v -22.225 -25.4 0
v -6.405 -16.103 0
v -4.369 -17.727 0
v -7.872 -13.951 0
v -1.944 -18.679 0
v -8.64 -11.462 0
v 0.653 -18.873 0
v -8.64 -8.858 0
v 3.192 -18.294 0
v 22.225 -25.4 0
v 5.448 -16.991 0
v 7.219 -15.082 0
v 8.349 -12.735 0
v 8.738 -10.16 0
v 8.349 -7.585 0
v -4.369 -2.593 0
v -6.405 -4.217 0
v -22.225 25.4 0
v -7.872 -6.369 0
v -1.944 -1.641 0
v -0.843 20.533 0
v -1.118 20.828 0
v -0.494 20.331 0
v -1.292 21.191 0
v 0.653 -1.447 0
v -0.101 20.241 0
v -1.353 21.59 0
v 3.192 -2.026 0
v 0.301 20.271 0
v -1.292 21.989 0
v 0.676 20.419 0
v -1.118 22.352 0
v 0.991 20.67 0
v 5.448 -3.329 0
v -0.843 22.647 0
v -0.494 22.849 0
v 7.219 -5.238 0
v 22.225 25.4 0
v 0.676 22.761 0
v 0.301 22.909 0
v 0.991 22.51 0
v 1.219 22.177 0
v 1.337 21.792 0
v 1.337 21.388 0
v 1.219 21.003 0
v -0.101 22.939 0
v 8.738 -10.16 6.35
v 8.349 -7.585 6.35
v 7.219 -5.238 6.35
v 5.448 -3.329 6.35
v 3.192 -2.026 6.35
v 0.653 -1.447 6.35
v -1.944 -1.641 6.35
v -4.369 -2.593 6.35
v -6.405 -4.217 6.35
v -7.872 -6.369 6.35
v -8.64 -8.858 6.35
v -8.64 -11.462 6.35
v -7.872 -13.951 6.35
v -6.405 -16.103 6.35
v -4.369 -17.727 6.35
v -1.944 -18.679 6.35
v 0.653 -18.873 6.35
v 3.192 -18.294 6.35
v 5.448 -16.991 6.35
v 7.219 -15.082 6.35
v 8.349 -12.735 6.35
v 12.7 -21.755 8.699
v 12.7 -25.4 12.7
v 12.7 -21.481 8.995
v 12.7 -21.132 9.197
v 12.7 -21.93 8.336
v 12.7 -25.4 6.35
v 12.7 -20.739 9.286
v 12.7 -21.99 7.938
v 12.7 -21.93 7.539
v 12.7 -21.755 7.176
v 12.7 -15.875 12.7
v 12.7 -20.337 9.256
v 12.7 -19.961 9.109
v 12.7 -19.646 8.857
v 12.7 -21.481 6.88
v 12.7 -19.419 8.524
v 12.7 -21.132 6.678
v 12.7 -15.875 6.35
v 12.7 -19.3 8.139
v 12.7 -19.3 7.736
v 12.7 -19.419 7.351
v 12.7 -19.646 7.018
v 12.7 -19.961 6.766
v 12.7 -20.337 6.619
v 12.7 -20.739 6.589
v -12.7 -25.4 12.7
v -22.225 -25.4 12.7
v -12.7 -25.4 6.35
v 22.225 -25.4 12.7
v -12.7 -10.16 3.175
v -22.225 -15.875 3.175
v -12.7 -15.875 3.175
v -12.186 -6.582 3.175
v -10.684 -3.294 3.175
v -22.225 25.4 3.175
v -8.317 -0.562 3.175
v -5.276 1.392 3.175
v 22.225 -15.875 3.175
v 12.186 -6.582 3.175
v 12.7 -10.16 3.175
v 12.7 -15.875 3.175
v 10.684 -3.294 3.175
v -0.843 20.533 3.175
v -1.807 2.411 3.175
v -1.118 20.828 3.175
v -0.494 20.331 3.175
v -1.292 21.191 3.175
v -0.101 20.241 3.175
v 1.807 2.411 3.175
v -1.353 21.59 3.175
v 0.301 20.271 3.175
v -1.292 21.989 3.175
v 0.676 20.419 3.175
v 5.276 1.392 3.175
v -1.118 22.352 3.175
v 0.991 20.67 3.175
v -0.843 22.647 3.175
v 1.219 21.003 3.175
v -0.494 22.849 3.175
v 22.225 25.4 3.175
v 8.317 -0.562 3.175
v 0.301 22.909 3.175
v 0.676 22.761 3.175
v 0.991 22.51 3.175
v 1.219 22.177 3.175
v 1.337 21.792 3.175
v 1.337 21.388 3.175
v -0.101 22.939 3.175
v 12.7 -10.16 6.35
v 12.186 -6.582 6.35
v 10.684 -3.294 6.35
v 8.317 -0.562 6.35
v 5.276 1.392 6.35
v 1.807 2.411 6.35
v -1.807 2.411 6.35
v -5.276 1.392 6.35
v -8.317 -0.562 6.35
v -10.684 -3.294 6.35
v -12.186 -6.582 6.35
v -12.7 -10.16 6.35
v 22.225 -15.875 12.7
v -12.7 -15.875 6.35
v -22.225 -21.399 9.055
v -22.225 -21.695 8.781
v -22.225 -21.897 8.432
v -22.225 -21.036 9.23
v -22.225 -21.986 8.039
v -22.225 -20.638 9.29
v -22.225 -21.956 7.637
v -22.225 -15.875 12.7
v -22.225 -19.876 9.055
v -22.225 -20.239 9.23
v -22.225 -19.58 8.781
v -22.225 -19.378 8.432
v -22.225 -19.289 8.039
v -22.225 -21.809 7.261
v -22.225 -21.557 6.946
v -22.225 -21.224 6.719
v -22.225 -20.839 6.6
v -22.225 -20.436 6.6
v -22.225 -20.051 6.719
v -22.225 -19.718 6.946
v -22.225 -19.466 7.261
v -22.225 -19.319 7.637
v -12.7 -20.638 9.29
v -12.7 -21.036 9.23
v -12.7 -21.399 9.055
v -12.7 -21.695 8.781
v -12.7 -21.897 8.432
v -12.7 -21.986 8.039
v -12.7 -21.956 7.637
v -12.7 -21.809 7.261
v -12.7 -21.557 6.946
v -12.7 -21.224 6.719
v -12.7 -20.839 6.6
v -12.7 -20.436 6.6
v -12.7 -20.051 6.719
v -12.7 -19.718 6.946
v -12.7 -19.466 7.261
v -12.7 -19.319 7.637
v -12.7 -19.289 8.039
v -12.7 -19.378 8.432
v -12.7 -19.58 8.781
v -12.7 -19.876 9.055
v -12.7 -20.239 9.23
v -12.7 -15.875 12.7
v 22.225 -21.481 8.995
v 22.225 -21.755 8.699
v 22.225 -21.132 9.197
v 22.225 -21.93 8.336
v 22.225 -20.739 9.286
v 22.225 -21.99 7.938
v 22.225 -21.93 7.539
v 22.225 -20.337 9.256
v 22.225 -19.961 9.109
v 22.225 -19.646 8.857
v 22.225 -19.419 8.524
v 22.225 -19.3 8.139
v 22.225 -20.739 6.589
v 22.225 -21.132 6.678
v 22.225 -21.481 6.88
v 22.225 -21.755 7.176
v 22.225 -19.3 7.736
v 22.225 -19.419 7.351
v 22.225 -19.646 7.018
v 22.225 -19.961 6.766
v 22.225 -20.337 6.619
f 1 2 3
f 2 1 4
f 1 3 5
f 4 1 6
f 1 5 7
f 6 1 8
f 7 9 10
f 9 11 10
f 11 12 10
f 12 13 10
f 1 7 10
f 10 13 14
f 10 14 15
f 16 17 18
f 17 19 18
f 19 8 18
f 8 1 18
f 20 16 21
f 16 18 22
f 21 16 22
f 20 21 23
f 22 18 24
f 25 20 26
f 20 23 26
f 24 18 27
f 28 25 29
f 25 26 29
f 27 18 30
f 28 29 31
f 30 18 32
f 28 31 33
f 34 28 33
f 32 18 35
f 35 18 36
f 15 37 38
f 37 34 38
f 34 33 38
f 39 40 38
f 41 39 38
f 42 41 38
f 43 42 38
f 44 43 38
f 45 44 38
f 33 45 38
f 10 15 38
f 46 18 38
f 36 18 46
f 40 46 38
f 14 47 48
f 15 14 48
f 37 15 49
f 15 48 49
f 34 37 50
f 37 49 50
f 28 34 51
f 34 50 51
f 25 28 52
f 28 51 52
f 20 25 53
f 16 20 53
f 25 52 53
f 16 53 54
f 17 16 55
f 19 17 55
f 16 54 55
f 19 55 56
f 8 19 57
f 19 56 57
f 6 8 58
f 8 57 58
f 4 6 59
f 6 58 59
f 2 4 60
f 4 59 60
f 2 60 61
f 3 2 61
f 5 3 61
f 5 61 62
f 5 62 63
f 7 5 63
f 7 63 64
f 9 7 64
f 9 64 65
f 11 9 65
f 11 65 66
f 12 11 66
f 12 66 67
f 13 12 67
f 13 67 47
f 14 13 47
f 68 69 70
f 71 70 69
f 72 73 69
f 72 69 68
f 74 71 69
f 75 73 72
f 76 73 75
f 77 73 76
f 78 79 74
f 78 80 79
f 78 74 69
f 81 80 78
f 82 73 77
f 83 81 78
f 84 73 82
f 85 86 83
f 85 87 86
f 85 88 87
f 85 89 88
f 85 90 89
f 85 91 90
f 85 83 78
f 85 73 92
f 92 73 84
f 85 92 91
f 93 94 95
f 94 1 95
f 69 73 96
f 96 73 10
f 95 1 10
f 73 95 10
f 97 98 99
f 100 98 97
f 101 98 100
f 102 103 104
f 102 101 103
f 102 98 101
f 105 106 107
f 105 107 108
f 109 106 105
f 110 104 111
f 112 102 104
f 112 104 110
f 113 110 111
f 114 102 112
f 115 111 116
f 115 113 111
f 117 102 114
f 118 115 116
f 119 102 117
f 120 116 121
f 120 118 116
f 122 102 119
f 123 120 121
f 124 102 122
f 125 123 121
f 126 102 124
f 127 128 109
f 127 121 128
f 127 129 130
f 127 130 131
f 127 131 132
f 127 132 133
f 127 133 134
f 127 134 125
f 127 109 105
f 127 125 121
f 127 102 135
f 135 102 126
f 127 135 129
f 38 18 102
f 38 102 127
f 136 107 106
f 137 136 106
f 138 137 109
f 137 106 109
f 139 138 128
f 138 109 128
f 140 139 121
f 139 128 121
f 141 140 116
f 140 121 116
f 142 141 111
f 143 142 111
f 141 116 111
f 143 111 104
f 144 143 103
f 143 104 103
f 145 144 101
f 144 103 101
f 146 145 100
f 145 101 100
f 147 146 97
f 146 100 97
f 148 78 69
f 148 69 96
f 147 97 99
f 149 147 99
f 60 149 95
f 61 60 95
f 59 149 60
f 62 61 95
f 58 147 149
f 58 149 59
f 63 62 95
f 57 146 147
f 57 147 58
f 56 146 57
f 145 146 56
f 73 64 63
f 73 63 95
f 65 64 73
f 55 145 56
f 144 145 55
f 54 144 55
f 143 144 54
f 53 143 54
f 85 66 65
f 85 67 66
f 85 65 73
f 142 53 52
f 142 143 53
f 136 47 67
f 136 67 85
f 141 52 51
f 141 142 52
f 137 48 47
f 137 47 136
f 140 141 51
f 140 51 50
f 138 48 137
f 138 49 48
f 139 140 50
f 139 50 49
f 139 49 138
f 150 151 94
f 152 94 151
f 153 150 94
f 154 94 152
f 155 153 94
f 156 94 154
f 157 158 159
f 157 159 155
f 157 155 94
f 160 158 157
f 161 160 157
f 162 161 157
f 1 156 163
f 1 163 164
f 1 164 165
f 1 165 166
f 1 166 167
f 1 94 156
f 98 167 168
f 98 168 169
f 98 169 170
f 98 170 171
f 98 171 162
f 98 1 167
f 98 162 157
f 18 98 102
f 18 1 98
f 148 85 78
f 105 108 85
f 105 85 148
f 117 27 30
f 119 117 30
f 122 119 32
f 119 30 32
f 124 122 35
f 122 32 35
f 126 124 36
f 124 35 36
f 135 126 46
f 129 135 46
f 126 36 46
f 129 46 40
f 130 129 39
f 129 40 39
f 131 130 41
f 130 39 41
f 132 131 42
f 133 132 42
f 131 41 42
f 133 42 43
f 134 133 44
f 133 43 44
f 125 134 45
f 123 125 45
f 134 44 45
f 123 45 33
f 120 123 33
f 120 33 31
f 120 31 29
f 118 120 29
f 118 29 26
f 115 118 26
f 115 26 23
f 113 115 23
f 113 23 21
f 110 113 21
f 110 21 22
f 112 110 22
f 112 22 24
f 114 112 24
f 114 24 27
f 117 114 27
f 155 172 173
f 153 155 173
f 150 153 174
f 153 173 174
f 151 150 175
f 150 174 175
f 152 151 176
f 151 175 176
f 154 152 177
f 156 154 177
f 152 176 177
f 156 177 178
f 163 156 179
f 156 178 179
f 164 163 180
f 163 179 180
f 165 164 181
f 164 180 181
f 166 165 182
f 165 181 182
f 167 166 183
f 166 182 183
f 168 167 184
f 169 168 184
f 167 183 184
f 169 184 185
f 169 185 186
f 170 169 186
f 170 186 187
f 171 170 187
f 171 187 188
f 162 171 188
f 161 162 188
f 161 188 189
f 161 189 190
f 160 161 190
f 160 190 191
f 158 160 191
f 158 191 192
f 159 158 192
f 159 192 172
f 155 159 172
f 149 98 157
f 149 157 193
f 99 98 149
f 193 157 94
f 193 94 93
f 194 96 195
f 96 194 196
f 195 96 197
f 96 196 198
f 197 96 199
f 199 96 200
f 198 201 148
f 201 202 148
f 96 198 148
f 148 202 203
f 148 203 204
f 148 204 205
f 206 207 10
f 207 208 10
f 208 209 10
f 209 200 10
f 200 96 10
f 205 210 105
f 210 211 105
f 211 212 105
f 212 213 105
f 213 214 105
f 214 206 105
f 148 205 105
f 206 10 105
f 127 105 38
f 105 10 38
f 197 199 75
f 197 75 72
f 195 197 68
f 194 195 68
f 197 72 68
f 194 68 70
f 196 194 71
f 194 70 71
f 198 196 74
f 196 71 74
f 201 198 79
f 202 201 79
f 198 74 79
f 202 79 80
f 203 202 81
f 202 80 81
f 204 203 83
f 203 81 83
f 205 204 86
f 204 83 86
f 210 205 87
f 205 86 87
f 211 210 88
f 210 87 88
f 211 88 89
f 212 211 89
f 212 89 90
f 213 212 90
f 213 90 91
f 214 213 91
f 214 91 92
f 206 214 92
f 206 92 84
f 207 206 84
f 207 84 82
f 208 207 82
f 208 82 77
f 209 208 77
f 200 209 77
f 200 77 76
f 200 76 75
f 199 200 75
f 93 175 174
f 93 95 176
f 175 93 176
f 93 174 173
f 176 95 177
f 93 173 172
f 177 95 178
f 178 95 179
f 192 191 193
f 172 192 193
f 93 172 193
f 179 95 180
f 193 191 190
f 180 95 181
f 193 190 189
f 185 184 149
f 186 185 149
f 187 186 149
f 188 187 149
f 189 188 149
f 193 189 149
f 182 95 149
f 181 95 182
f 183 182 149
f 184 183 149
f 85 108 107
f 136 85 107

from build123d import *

# Parameters (mm, degrees)
SKETCH1_W                           = 44.45
SKETCH1_H                           = 50.8
BOSS_EXTRUDE1_DEPTH                 = 3.175
BOSS_EXTRUDE2_DEPTH                 = 3.175
SKETCH3_W                           = 9.525
SKETCH3_H                           = 9.525
BOSS_EXTRUDE3_DEPTH                 = 9.525
SKETCH4_R                           = 8.7376
CUT_EXTRUDE1_DEPTH                  = 7.35
F_6_32_TAPPED_HOLE1_D               = 2.7051
F_6_32_TAPPED_HOLE1_DEPTH           = 9.525
F_6_32_TAPPED_HOLE1_ON_FACE_2_D     = 2.7051
F_6_32_TAPPED_HOLE1_ON_FACE_2_DEPTH = 9.525
F_6_32_TAPPED_HOLE1_ON_FACE_3_D     = 2.7051
F_6_32_TAPPED_HOLE1_ON_FACE_3_DEPTH = 9.525


with BuildPart() as part:
    # Sketch1 → Boss-Extrude1 (new body)
    with BuildSketch(Plane.XY):
        Rectangle(SKETCH1_W, SKETCH1_H)
    extrude(amount=BOSS_EXTRUDE1_DEPTH)

    # Sketch2 → Boss-Extrude2 (add)
    with BuildSketch(Plane.XY.offset(3.175)):
        with BuildLine():
            Line((-12.7, -10.16), (-12.7, -25.4))
            Line((-12.7, -25.4), (12.7, -25.4))
            Line((12.7, -25.4), (12.7, -10.16))
            ThreePointArc((12.7, -10.16), (0, 2.54), (-12.7, -10.16))
        make_face()
    extrude(amount=BOSS_EXTRUDE2_DEPTH)

    # Sketch3 → Boss-Extrude3 (add)
    with BuildSketch(Plane.XY.offset(3.175)):
        with Locations((-17.4625, -20.6375)):
            Rectangle(SKETCH3_W, SKETCH3_H)
        with Locations((17.4625, -20.6375)):
            Rectangle(SKETCH3_W, SKETCH3_H)
    extrude(amount=BOSS_EXTRUDE3_DEPTH)

    # Sketch4 → Cut-Extrude1 (cut, through all)
    with BuildSketch(Plane.XY.offset(6.35)):
        with Locations((0, -10.16)):
            Circle(SKETCH4_R)
    extrude(amount=-CUT_EXTRUDE1_DEPTH, mode=Mode.SUBTRACT)

    # #6-32 Tapped Hole1
    with Locations(Plane(origin=(22.225, -20.6375, 7.9375), x_dir=(0, 1, 0), z_dir=(1, 0, 0))):
        with Locations((0, 0)):
            Hole(F_6_32_TAPPED_HOLE1_D / 2, depth=F_6_32_TAPPED_HOLE1_DEPTH)

    # #6-32 Tapped Hole1 on face 2
    with Locations(Plane(origin=(-22.225, -20.6375, 7.9375), x_dir=(0, 0, -1), z_dir=(-1, 0, 0))):
        with Locations((0, 0)):
            Hole(F_6_32_TAPPED_HOLE1_ON_FACE_2_D / 2, depth=F_6_32_TAPPED_HOLE1_ON_FACE_2_DEPTH)

    # #6-32 Tapped Hole1 on face 3
    with Locations(Plane(origin=(0, 21.59, 3.175), x_dir=(1, 0, 0), z_dir=(0, 0, 1))):
        with Locations((0, 0)):
            Hole(F_6_32_TAPPED_HOLE1_ON_FACE_3_D / 2, depth=F_6_32_TAPPED_HOLE1_ON_FACE_3_DEPTH)


solid = part.part
